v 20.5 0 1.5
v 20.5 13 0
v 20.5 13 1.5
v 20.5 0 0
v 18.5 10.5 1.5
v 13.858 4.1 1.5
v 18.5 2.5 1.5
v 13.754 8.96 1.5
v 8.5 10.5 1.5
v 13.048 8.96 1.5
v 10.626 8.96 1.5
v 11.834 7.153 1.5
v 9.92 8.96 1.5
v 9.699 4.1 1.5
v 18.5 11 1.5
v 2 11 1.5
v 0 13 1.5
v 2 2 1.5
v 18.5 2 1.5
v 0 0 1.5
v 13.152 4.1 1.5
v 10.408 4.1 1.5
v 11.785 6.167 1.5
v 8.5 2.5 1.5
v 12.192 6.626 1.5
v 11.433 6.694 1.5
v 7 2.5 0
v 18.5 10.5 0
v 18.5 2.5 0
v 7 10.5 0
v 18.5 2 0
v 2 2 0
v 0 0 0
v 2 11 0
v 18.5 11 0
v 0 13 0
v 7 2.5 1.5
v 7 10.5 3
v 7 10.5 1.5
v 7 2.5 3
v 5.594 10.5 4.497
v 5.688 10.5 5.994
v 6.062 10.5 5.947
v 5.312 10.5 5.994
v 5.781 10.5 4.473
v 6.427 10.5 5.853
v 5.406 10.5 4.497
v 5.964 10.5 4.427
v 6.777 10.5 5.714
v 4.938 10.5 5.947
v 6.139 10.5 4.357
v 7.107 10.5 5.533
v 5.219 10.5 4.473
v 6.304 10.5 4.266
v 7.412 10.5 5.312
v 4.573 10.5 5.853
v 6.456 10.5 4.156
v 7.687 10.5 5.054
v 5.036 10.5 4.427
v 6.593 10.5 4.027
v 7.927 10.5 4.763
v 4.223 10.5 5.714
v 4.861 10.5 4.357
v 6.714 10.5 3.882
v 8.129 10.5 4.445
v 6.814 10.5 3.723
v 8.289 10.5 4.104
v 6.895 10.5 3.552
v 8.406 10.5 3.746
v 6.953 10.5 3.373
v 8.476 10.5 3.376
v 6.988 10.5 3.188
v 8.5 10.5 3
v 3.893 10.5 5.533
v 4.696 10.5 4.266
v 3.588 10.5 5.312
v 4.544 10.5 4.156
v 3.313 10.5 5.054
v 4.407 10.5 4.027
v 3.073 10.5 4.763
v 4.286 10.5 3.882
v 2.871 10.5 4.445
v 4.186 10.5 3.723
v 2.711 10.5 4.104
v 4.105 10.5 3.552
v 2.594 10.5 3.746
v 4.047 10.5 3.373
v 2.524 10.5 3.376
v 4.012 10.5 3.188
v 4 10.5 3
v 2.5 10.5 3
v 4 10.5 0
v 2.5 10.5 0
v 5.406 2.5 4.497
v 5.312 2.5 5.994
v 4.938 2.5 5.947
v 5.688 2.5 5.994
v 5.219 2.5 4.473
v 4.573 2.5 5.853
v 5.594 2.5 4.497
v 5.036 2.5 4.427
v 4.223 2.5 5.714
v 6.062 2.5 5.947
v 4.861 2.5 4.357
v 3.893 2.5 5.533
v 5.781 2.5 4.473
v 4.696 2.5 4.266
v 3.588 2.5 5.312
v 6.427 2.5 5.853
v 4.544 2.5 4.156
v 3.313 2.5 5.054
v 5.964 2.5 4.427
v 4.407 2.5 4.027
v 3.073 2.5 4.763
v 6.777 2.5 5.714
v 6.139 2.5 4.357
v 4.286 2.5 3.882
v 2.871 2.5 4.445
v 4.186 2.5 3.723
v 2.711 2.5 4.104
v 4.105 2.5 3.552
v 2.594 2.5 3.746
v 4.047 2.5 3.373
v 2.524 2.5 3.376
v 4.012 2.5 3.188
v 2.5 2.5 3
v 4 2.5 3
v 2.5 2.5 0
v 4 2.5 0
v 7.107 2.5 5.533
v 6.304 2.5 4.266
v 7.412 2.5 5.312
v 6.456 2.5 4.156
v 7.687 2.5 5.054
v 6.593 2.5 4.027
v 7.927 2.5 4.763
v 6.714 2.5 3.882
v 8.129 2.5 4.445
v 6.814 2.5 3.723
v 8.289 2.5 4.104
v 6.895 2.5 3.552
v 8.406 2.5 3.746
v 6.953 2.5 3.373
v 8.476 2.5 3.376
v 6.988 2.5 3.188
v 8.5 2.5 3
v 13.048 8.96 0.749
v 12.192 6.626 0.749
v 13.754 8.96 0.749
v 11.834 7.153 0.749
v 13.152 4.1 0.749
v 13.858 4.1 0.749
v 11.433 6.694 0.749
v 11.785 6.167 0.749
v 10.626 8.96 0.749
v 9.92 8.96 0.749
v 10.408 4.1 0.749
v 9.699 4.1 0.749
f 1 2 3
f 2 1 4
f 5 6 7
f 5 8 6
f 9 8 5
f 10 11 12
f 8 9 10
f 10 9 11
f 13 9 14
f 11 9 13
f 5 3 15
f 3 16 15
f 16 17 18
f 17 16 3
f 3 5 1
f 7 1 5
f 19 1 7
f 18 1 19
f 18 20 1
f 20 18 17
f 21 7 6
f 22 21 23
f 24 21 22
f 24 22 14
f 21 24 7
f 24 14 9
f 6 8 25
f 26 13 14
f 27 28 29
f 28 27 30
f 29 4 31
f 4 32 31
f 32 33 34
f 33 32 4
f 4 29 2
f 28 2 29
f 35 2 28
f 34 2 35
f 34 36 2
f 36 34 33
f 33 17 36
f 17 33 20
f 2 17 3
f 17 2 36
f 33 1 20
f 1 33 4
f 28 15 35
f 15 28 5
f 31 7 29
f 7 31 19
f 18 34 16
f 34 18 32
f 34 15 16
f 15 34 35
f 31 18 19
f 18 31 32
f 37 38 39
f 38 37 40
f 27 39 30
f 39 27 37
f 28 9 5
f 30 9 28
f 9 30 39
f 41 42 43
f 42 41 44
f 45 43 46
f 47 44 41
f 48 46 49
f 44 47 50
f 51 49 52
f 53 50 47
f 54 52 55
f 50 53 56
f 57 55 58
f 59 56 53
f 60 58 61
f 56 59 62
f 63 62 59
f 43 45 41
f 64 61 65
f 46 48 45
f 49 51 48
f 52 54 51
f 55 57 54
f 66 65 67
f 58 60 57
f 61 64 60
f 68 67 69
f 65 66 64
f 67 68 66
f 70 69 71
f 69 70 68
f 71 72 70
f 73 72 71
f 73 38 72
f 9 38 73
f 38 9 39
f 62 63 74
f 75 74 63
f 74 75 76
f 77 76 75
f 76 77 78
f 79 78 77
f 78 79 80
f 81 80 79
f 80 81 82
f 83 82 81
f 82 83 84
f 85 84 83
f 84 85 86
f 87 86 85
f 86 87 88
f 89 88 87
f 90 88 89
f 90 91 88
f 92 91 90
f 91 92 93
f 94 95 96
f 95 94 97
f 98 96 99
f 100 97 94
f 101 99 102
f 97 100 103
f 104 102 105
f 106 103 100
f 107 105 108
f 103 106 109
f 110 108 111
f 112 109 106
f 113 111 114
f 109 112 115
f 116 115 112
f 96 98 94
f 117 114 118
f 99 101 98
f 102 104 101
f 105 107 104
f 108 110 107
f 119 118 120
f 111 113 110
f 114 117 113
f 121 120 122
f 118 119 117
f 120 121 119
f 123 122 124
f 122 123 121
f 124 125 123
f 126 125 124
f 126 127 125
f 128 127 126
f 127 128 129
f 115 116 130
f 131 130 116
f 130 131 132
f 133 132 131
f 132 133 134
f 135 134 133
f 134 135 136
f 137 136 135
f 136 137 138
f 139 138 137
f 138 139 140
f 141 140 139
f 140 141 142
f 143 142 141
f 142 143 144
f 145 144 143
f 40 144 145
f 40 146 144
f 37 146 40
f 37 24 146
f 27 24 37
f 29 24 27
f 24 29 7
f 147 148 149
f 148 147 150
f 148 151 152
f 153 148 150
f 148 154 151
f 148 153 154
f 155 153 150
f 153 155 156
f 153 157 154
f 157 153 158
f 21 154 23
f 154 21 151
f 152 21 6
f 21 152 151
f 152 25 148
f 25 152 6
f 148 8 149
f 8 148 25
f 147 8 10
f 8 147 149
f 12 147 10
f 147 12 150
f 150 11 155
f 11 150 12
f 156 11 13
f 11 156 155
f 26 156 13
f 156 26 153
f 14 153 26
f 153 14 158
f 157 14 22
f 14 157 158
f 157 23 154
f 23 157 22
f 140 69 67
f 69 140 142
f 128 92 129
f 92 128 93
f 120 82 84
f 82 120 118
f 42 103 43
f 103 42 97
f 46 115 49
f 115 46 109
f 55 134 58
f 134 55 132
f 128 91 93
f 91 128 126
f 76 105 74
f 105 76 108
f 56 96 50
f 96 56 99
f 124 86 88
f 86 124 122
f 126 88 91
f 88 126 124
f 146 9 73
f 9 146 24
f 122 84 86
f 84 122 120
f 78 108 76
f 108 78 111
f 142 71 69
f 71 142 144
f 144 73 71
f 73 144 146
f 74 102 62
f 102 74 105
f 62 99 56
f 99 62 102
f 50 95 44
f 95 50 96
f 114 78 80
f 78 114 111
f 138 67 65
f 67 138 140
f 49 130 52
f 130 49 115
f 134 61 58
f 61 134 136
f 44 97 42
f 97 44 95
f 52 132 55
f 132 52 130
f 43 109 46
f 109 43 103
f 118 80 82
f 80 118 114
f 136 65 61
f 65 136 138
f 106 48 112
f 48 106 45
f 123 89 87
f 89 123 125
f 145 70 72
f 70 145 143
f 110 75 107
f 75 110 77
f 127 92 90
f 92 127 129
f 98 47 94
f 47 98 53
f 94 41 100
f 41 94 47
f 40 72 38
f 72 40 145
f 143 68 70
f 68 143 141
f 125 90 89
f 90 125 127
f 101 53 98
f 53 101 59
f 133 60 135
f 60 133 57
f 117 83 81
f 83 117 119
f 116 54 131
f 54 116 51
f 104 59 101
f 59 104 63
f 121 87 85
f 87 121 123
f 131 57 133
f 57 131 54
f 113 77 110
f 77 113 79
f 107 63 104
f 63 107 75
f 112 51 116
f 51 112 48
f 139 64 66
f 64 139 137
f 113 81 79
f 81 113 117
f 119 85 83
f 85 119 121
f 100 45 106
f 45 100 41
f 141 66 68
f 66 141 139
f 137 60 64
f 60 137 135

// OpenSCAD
//Parameters
//Diameter of cable (mm)
cablediam = 3;
//Length label (part right of the cable without edge, mm) 
lablength = 10;
//Width label (without edge, mm)
labwidth = 8;  
//Overall thicknes of the part (mm)
thickness = 1.5;  
//Text on label (use spaces for aligning)
labeltext = "X";  
//Font, correct spelled and with capitals
textfont = "Arial Black"; 
//Text appearance, 0=raised, 1=sunk, 2 = hole 
textappear=1;   

//Modules

module rim()
{
  difference()
  {
    cube([lo,wo,th]);
    translate([wr,wr,-0.5*th])
      cube([li+sp,wi+sp*2, th*2]);
  }
}

module labelplate()
{
  translate([wr+sp+cd+th, wr+sp,0])
    cube([li-cd-th,wi, th]);  
}  

module labeltext()
{
  translate([wr+sp+cd+th*3+1.5, wr+sp+wi*(1-sf)/2,0])
    linear_extrude(height = th*1.5)
      text(labeltext, size = wi*sf, font = textfont);
}  

module chull(cdh,wih,tcb)
{
  hull()  
  {
    translate([0,0,-tcb])
      cube([cdh, wih,cdh/2]);   
    translate([cdh/2,wih/2,cdh/2])
      rotate([90,0,0])  
        cylinder(d=cdh, wih, center=true); 
  }
}  

module cablehull()
{
  translate([wr+sp,wr+sp,0])
    difference()
    {
      chull(cd+th*2, wi,0);
      translate([th,-wi/2,th])
        chull(cd,wi*2, th*2);
    }  
}  



//main
//secondary parameters

sp = 0.5;          //space between label and outerrim
wi = labwidth;     //inner length
cd = cablediam;    //cable diameter
th = thickness;    //thickness plate
wr = wi/4;         //width outer rim
wo = labwidth + sp*2 + wr*2; //total width 
li = lablength + cd + th*2;  //inner length
lo = li + sp + wr*2;   //total length  
sf = 0.6;              //factor of wi for textsize
$fn=50;

rim();
if (textappear==0)
{
  labelplate();
  labeltext();
} 
else  
{
  difference()
  {
    labelplate();
    //-0.001 is irritating but for clean preview
    translate([-2,0,(2-textappear)*th/2-0.001])  
      labeltext();
  } 
}  
cablehull();
